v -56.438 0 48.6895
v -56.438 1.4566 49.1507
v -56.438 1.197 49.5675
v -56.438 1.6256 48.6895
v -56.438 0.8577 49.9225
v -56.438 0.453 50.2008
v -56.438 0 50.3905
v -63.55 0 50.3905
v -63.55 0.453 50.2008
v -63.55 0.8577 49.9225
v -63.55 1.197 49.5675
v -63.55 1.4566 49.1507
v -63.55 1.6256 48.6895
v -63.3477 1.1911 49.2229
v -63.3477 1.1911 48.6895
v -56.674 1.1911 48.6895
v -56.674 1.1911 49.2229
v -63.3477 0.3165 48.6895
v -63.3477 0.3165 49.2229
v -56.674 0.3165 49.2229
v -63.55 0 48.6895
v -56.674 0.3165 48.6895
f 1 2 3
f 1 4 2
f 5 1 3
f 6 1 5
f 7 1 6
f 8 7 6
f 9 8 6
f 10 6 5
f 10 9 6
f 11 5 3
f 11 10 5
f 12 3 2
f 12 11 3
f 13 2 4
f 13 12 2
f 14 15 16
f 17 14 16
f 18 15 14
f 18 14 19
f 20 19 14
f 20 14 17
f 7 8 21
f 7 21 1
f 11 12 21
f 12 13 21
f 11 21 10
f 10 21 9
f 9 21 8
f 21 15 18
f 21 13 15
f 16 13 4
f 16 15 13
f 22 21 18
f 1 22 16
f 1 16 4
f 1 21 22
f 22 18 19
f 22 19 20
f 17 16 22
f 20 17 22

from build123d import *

# Parameters (mm, degrees)
F0_W        = 7.112
F0_H        = 1.8034
F1_DEPTH    = 1.6256
F2_T1_DEPTH = 18.7023867637
F3_W        = 6.6736862063
F3_H        = 0.8746144013
F4_DEPTH    = 0.5334


# Not quite as in the source:
# - a fillet or chamfer that OpenCascade refuses, or shapes differently, is made with other operations: its cross-section is extruded or revolved along the edge and cut away or added


with BuildPart() as f1:
    # F0 (on Front) → F1 (new body)
    with BuildSketch(Plane.XZ):
        with Locations((-59.9939581946, 49.5912485233)):
            Rectangle(F0_W, F0_H)
    extrude(amount=-F1_DEPTH)

    # F2: fillet of radius 2.3915199549 on 1 edges, made by hand

    # F2_s2 → F2_t1 (cut)
    with BuildSketch(Plane.YZ.offset(-69.3451515765)):
        with BuildLine():
            ThreePointArc((-0.6924773527, 50.4929485233), (0.7760026585, 49.9890021832), (1.6256, 48.6895485233))
            Line((1.6256, 48.6895485233), (1.6719615471, 48.7013109224))
            ThreePointArc((1.6719615471, 48.7013109224), (1.6734303991, 49.5912485233), (1.6734303991, 50.4929485233))
            Line((1.6734303991, 50.4929485233), (1.6256, 50.5407789224))
            Line((1.6256, 50.5407789224), (-0.6924773527, 50.5407789224))
            Line((-0.6924773527, 50.5407789224), (-0.6924773527, 50.4929485233))
        make_face()
    extrude(amount=F2_T1_DEPTH, mode=Mode.SUBTRACT)

    # F3 (on face) → F4 (cut)
    with BuildSketch(Plane(origin=(0, 0, 48.6895485233), x_dir=(1, 0, 0), z_dir=(0, 0, -1))):
        with Locations((-60.0108616054, -0.7537669444)):
            Rectangle(F3_W, F3_H)
    extrude(amount=-F4_DEPTH, mode=Mode.SUBTRACT)


solid = f1.part
